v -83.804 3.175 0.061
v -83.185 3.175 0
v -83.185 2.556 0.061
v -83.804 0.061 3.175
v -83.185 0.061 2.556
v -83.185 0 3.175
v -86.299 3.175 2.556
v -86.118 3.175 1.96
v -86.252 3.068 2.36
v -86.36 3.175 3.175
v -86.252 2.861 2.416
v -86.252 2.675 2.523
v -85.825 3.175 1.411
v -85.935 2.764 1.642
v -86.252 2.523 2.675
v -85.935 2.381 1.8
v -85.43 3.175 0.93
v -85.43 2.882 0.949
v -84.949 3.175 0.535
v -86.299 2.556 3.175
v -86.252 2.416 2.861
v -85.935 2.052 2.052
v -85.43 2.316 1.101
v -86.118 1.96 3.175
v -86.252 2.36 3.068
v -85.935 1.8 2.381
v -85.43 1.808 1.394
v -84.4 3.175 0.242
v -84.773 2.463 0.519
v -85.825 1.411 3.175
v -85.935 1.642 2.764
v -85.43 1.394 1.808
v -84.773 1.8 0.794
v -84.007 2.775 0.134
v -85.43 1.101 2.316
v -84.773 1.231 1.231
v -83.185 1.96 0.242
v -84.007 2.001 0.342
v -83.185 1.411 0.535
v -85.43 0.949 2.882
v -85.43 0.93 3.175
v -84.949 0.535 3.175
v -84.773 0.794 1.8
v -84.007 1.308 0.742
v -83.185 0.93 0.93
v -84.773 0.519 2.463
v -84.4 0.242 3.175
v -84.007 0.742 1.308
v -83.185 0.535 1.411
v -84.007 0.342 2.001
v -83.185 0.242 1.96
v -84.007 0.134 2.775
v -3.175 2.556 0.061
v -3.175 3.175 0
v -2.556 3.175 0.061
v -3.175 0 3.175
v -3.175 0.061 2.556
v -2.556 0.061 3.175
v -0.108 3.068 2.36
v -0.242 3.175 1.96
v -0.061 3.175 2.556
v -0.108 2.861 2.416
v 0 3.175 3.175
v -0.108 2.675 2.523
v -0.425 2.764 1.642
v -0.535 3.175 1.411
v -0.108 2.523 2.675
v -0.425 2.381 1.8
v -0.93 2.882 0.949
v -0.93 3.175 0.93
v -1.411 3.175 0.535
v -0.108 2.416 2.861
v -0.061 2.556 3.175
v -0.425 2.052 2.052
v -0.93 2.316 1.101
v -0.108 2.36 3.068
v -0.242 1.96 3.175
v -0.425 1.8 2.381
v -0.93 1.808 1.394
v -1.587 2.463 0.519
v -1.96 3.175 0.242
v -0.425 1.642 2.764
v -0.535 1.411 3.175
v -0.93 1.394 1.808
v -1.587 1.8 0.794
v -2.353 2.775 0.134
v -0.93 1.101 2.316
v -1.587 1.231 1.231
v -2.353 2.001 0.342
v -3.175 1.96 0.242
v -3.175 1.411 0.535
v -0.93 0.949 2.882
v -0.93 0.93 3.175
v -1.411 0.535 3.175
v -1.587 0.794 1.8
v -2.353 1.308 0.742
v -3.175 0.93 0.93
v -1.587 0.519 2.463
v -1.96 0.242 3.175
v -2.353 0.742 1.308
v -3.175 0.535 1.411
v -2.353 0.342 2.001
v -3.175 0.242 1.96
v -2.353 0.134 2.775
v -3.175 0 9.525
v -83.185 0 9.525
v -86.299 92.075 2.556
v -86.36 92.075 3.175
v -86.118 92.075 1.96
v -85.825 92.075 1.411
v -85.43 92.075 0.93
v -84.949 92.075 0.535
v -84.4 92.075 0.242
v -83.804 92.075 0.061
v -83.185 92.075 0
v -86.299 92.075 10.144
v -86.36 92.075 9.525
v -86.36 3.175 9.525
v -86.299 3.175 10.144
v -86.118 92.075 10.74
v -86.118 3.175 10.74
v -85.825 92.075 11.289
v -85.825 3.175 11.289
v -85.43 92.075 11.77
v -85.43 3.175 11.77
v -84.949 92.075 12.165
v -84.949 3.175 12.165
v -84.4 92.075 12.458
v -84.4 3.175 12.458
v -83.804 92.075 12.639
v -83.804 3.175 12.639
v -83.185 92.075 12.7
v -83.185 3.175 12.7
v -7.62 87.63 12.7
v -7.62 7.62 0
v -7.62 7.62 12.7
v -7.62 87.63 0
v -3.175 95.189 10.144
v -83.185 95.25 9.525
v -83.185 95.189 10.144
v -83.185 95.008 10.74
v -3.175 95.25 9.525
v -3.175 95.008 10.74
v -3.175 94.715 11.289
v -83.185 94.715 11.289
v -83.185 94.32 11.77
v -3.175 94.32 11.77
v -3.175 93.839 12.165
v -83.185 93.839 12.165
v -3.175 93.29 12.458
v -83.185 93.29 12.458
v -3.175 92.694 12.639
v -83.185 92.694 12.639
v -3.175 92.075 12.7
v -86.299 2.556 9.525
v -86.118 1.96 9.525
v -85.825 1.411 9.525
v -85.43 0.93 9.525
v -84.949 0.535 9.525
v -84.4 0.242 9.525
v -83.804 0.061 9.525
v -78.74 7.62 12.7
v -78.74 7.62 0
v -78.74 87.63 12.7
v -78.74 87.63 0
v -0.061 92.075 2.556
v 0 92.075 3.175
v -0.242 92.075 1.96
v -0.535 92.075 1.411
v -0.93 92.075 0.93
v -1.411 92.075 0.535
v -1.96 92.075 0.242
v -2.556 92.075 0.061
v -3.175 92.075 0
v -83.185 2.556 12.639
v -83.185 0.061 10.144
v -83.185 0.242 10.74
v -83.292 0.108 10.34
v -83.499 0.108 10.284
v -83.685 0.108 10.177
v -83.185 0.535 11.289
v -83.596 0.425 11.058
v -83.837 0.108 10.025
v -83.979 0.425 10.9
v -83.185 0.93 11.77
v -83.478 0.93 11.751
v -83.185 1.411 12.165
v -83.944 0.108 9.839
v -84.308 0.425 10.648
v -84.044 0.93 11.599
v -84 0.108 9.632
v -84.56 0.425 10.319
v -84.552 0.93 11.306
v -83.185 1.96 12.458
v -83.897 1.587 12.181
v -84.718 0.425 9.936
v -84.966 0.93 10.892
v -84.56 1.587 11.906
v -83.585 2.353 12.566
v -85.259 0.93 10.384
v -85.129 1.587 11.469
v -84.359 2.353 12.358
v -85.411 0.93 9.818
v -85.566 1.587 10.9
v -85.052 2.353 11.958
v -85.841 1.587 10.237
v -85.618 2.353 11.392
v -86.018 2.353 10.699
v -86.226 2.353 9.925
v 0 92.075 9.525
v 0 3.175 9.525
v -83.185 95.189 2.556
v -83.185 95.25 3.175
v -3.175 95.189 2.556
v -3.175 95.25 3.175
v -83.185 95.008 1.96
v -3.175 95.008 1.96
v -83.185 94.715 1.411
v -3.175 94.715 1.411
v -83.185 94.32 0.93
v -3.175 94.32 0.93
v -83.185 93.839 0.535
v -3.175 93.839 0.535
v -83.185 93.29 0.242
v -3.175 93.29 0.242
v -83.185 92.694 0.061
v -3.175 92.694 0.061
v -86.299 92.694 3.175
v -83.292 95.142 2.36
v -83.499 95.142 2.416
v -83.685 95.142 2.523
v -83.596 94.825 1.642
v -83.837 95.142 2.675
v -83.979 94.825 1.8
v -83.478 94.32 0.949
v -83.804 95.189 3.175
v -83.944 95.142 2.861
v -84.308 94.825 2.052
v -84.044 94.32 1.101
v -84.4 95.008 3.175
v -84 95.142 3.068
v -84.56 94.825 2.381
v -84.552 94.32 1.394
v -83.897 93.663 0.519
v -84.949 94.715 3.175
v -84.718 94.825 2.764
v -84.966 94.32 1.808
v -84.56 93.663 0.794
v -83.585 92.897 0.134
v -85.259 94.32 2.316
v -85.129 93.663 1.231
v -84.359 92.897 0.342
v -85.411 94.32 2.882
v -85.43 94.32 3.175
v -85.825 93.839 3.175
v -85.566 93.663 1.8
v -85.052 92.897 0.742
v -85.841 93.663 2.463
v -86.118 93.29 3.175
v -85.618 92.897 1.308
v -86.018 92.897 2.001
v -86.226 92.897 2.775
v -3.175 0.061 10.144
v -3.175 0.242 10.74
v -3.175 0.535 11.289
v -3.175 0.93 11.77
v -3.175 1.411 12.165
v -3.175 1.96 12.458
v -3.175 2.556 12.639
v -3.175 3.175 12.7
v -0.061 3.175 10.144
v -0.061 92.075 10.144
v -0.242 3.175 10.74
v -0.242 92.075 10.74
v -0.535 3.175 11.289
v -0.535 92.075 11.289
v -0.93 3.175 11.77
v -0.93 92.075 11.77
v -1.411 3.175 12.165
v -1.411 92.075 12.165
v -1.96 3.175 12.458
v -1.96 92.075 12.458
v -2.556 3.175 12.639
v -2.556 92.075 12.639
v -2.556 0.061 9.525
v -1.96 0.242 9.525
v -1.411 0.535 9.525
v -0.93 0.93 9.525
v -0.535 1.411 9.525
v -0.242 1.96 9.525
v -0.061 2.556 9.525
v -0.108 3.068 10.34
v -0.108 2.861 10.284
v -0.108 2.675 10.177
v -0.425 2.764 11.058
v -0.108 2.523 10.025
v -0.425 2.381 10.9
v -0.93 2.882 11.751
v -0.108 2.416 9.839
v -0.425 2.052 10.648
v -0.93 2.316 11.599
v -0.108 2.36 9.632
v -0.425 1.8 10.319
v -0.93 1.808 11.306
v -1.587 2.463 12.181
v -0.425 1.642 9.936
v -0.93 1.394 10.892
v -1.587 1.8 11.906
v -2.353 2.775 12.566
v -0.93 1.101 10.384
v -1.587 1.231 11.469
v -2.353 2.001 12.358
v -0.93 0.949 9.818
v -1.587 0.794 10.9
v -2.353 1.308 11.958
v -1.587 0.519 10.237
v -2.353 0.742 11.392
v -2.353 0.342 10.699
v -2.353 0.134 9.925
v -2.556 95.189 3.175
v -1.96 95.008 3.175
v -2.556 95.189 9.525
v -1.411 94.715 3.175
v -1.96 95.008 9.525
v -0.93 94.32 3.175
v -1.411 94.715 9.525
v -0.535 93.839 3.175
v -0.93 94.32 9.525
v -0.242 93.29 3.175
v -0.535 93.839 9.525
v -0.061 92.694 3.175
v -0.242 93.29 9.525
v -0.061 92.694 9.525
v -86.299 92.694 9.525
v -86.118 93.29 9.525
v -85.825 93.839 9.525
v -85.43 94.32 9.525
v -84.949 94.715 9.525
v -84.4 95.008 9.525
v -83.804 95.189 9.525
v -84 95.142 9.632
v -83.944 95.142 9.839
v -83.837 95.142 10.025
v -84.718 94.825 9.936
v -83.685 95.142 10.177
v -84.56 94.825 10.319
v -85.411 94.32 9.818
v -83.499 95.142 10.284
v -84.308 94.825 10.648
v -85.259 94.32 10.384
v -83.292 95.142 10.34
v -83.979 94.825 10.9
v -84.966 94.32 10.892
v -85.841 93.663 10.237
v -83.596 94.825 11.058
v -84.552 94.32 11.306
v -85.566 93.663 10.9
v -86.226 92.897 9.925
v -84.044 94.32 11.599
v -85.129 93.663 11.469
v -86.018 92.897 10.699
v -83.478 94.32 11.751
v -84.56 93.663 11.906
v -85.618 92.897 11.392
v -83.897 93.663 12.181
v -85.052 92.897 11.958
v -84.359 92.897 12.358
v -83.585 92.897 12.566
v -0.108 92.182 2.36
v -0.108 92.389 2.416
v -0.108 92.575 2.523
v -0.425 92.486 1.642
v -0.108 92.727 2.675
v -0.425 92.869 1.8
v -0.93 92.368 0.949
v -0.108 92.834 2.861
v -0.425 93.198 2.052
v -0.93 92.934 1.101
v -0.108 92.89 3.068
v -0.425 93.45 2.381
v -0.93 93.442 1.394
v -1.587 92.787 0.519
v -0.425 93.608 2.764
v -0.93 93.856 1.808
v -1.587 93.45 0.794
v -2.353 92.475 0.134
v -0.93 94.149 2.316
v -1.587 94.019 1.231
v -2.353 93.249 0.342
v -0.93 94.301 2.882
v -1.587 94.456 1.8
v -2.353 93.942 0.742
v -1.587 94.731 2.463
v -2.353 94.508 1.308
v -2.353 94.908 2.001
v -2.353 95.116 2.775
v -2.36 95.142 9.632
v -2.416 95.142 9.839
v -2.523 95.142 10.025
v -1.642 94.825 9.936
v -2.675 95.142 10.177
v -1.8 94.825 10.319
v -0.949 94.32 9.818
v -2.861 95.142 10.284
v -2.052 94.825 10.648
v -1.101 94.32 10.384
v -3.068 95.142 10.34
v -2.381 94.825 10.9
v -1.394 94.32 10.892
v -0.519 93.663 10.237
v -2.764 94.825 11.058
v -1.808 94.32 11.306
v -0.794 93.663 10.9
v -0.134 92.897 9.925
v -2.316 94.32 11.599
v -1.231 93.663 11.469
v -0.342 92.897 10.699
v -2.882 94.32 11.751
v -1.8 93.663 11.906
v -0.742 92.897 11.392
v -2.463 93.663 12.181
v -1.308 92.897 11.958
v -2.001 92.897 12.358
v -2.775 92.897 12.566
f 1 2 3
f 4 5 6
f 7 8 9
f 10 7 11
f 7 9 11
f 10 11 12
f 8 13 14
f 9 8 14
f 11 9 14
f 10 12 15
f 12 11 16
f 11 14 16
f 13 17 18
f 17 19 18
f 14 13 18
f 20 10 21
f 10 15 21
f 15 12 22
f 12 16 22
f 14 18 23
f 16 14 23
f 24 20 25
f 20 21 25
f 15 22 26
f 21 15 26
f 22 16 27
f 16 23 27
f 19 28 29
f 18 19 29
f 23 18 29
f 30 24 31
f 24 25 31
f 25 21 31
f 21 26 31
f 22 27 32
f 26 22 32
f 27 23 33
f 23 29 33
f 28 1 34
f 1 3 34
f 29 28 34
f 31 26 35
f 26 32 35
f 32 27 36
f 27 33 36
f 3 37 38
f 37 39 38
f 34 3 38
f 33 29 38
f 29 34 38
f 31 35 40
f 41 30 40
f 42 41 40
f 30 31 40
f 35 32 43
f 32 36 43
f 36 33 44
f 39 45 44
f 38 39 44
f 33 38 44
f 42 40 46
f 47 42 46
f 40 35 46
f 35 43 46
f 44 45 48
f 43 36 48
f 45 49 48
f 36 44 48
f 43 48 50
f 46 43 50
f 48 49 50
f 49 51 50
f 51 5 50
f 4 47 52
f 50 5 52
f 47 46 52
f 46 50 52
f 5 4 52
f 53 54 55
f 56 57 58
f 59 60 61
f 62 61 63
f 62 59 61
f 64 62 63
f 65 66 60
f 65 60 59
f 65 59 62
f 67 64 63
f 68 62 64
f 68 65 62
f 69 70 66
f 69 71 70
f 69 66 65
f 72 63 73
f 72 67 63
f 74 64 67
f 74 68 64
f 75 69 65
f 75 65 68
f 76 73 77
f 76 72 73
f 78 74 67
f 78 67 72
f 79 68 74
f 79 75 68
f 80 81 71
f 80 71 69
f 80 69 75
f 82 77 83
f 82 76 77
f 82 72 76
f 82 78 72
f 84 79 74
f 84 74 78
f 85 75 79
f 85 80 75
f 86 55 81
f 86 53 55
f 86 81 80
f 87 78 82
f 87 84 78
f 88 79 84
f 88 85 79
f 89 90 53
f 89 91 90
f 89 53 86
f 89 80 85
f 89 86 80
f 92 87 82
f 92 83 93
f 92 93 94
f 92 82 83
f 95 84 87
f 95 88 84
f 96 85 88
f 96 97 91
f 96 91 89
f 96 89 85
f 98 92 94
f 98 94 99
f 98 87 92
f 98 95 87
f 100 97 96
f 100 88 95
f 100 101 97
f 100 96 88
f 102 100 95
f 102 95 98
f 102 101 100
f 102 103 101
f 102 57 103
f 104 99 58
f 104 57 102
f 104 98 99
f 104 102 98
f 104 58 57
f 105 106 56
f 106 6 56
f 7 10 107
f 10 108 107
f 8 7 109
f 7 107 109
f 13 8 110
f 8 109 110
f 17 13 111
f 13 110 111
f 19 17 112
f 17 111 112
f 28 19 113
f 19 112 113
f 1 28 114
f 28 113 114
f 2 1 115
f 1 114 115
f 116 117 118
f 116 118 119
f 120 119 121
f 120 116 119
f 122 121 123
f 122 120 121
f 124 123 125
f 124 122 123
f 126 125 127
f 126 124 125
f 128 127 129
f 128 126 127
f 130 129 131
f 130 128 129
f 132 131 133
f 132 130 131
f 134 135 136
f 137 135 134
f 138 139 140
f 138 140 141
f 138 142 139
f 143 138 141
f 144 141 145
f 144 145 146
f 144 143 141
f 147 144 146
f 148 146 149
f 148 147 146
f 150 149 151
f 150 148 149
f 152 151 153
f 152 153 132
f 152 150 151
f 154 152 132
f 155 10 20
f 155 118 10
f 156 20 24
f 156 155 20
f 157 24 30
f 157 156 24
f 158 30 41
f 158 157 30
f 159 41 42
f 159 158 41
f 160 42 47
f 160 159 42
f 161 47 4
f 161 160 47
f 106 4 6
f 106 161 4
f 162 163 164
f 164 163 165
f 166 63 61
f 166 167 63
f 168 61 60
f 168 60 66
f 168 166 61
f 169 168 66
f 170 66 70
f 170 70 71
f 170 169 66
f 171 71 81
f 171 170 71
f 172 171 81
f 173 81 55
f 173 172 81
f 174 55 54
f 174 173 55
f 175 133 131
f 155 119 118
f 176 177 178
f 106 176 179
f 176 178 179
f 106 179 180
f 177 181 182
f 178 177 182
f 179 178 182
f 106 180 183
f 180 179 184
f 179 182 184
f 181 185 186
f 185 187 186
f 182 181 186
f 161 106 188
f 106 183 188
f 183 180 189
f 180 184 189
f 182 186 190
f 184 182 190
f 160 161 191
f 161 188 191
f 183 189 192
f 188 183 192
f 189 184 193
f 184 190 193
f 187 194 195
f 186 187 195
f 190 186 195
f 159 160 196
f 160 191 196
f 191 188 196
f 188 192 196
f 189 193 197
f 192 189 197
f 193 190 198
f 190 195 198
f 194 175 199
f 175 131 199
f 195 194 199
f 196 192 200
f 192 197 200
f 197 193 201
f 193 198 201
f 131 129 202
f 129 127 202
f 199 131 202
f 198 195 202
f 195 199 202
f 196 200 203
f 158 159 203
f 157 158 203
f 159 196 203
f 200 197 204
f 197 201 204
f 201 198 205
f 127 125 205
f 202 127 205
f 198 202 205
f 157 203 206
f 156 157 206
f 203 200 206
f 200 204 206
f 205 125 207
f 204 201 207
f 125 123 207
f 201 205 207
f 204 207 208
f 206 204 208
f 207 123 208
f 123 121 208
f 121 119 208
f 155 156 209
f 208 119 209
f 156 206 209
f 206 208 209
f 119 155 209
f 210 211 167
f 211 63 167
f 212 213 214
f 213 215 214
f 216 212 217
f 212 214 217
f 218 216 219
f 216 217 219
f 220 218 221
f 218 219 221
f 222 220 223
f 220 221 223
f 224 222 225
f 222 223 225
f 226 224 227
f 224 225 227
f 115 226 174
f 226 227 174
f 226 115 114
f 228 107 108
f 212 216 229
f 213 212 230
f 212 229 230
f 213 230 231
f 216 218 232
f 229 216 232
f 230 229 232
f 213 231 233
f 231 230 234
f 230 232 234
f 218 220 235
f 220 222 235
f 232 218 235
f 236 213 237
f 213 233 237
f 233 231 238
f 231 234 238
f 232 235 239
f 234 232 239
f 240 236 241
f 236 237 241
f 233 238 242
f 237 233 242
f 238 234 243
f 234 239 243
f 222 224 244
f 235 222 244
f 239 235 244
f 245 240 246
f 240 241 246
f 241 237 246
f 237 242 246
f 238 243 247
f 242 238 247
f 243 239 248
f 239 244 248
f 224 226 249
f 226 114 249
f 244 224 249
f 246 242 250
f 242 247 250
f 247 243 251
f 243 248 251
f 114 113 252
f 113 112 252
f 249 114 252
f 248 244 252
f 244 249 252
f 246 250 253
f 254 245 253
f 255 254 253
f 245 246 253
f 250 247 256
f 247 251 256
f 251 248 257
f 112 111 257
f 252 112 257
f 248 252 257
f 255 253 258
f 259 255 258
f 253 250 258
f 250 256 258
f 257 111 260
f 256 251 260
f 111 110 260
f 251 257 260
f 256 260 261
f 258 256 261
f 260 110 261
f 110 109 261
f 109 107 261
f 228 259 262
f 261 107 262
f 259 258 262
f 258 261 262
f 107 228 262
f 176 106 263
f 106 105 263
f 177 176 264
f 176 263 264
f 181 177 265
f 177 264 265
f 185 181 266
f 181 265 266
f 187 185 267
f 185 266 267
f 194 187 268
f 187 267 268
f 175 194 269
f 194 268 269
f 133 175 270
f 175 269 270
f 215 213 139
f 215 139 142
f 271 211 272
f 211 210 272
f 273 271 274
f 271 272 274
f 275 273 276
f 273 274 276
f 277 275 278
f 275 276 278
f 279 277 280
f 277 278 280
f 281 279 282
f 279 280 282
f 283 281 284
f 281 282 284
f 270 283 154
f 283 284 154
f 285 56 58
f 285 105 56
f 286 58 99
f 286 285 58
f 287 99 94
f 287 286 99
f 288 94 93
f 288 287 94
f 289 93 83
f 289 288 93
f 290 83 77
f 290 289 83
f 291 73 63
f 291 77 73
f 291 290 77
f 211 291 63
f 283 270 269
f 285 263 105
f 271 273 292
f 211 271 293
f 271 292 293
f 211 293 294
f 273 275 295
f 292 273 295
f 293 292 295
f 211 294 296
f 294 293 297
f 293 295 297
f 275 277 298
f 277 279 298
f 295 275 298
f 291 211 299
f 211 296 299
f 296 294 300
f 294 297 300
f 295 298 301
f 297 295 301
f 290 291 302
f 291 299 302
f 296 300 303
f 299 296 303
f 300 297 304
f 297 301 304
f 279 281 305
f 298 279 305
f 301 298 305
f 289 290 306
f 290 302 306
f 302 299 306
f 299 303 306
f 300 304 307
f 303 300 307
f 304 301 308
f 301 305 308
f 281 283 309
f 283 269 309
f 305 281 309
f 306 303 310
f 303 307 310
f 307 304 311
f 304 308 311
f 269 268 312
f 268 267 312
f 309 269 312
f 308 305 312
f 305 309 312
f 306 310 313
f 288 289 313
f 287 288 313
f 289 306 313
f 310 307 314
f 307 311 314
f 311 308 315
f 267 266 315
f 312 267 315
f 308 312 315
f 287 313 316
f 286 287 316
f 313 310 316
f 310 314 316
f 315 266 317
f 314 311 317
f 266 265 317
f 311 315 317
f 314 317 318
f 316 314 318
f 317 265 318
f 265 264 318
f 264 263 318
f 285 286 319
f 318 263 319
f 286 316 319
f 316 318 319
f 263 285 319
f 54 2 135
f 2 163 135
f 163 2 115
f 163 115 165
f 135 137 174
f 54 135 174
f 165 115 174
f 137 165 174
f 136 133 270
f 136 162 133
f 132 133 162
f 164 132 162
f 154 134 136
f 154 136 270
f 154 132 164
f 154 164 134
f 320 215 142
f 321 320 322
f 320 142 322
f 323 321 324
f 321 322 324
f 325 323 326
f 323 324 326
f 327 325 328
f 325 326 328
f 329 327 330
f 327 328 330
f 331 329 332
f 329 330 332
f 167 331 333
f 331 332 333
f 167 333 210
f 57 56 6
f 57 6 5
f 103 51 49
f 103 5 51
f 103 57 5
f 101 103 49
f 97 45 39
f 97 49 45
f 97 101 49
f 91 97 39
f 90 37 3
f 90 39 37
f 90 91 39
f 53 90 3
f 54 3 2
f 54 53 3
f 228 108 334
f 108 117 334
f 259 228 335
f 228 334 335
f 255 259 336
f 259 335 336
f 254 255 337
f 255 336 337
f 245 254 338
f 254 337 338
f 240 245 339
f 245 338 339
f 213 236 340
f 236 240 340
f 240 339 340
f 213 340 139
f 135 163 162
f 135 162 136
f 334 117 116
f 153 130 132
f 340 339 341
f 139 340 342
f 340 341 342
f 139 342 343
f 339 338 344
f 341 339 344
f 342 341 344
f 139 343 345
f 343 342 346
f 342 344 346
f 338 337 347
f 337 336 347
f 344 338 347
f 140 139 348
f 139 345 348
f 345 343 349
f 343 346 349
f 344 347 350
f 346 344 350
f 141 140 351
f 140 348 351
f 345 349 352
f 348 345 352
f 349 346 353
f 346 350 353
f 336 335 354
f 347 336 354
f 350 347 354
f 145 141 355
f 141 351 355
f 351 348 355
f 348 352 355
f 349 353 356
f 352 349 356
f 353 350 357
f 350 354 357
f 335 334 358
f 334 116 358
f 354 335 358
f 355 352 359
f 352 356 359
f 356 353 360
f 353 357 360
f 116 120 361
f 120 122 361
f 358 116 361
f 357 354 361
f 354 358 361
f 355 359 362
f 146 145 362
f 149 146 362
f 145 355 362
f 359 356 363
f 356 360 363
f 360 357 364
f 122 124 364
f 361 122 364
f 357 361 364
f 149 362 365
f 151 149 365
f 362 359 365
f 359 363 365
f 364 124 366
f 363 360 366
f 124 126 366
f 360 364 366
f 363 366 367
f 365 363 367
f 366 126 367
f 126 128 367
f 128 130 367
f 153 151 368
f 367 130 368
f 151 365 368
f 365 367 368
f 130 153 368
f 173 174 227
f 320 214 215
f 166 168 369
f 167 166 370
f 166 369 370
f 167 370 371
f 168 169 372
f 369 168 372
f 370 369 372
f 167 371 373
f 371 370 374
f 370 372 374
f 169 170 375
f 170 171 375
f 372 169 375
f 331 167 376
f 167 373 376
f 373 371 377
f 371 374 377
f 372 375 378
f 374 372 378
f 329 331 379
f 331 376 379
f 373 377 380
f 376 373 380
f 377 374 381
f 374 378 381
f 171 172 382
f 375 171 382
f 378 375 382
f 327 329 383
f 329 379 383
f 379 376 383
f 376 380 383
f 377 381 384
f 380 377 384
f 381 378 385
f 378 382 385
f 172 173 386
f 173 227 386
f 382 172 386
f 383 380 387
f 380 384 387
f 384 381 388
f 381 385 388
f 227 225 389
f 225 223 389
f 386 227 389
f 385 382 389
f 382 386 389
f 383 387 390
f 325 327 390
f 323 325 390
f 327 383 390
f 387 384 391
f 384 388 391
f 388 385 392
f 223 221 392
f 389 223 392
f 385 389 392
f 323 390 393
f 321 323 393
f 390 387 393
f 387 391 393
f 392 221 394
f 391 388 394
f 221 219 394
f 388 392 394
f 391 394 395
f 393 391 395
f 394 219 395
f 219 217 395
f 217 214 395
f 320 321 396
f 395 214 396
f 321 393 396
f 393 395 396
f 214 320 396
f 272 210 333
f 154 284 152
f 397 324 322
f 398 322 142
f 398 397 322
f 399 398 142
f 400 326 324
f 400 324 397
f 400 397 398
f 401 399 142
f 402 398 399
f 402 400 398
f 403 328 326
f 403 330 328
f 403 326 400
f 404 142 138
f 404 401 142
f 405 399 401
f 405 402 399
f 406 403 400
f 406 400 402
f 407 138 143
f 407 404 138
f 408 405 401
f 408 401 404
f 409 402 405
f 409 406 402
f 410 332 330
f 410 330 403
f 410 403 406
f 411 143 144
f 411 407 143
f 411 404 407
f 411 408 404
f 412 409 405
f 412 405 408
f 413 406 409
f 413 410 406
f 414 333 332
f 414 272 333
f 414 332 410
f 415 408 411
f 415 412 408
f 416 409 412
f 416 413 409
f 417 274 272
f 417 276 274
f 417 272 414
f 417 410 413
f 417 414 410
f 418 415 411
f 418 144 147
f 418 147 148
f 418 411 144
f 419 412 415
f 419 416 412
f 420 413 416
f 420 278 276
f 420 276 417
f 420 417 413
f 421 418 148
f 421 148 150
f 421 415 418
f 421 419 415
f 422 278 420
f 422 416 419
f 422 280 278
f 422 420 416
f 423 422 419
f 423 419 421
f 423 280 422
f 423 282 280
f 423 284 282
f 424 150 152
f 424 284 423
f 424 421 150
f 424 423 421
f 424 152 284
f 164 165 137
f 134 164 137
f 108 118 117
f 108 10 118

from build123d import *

# Parameters (mm, degrees)
SKETCH1_W           = 86.36
SKETCH1_H           = 95.25
SKETCH1_W_2         = 71.12
SKETCH1_H_2         = 80.01
BOSS_EXTRUDE1_DEPTH = 12.7
FILLET1_R           = 3.175


with BuildPart() as part:
    # Sketch1 → Boss-Extrude1 (new body)
    with BuildSketch(Plane.XY):
        with Locations((-43.18, 47.625)):
            Rectangle(SKETCH1_W, SKETCH1_H)
        with Locations((-43.18, 47.625)):
            Rectangle(SKETCH1_W_2, SKETCH1_H_2, mode=Mode.SUBTRACT)
    extrude(amount=BOSS_EXTRUDE1_DEPTH)

    # Fillet1
    fillet1_edges = [part.edges().sort_by_distance(p)[0] for p in [
        (-86.36, 47.625, 12.7),
        (-43.18, 0, 12.7),
        (0, 47.625, 12.7),
        (-43.18, 0, 0),
        (-86.36, 47.625, 0),
        (-43.18, 95.25, 0),
        (0, 47.625, 0),
        (0, 0, 6.35),
        (-86.36, 0, 6.35),
        (-86.36, 95.25, 6.35),
        (0, 95.25, 6.35),
        (-43.18, 95.25, 12.7),
    ]]
    fillet(fillet1_edges, radius=FILLET1_R)


solid = part.part
